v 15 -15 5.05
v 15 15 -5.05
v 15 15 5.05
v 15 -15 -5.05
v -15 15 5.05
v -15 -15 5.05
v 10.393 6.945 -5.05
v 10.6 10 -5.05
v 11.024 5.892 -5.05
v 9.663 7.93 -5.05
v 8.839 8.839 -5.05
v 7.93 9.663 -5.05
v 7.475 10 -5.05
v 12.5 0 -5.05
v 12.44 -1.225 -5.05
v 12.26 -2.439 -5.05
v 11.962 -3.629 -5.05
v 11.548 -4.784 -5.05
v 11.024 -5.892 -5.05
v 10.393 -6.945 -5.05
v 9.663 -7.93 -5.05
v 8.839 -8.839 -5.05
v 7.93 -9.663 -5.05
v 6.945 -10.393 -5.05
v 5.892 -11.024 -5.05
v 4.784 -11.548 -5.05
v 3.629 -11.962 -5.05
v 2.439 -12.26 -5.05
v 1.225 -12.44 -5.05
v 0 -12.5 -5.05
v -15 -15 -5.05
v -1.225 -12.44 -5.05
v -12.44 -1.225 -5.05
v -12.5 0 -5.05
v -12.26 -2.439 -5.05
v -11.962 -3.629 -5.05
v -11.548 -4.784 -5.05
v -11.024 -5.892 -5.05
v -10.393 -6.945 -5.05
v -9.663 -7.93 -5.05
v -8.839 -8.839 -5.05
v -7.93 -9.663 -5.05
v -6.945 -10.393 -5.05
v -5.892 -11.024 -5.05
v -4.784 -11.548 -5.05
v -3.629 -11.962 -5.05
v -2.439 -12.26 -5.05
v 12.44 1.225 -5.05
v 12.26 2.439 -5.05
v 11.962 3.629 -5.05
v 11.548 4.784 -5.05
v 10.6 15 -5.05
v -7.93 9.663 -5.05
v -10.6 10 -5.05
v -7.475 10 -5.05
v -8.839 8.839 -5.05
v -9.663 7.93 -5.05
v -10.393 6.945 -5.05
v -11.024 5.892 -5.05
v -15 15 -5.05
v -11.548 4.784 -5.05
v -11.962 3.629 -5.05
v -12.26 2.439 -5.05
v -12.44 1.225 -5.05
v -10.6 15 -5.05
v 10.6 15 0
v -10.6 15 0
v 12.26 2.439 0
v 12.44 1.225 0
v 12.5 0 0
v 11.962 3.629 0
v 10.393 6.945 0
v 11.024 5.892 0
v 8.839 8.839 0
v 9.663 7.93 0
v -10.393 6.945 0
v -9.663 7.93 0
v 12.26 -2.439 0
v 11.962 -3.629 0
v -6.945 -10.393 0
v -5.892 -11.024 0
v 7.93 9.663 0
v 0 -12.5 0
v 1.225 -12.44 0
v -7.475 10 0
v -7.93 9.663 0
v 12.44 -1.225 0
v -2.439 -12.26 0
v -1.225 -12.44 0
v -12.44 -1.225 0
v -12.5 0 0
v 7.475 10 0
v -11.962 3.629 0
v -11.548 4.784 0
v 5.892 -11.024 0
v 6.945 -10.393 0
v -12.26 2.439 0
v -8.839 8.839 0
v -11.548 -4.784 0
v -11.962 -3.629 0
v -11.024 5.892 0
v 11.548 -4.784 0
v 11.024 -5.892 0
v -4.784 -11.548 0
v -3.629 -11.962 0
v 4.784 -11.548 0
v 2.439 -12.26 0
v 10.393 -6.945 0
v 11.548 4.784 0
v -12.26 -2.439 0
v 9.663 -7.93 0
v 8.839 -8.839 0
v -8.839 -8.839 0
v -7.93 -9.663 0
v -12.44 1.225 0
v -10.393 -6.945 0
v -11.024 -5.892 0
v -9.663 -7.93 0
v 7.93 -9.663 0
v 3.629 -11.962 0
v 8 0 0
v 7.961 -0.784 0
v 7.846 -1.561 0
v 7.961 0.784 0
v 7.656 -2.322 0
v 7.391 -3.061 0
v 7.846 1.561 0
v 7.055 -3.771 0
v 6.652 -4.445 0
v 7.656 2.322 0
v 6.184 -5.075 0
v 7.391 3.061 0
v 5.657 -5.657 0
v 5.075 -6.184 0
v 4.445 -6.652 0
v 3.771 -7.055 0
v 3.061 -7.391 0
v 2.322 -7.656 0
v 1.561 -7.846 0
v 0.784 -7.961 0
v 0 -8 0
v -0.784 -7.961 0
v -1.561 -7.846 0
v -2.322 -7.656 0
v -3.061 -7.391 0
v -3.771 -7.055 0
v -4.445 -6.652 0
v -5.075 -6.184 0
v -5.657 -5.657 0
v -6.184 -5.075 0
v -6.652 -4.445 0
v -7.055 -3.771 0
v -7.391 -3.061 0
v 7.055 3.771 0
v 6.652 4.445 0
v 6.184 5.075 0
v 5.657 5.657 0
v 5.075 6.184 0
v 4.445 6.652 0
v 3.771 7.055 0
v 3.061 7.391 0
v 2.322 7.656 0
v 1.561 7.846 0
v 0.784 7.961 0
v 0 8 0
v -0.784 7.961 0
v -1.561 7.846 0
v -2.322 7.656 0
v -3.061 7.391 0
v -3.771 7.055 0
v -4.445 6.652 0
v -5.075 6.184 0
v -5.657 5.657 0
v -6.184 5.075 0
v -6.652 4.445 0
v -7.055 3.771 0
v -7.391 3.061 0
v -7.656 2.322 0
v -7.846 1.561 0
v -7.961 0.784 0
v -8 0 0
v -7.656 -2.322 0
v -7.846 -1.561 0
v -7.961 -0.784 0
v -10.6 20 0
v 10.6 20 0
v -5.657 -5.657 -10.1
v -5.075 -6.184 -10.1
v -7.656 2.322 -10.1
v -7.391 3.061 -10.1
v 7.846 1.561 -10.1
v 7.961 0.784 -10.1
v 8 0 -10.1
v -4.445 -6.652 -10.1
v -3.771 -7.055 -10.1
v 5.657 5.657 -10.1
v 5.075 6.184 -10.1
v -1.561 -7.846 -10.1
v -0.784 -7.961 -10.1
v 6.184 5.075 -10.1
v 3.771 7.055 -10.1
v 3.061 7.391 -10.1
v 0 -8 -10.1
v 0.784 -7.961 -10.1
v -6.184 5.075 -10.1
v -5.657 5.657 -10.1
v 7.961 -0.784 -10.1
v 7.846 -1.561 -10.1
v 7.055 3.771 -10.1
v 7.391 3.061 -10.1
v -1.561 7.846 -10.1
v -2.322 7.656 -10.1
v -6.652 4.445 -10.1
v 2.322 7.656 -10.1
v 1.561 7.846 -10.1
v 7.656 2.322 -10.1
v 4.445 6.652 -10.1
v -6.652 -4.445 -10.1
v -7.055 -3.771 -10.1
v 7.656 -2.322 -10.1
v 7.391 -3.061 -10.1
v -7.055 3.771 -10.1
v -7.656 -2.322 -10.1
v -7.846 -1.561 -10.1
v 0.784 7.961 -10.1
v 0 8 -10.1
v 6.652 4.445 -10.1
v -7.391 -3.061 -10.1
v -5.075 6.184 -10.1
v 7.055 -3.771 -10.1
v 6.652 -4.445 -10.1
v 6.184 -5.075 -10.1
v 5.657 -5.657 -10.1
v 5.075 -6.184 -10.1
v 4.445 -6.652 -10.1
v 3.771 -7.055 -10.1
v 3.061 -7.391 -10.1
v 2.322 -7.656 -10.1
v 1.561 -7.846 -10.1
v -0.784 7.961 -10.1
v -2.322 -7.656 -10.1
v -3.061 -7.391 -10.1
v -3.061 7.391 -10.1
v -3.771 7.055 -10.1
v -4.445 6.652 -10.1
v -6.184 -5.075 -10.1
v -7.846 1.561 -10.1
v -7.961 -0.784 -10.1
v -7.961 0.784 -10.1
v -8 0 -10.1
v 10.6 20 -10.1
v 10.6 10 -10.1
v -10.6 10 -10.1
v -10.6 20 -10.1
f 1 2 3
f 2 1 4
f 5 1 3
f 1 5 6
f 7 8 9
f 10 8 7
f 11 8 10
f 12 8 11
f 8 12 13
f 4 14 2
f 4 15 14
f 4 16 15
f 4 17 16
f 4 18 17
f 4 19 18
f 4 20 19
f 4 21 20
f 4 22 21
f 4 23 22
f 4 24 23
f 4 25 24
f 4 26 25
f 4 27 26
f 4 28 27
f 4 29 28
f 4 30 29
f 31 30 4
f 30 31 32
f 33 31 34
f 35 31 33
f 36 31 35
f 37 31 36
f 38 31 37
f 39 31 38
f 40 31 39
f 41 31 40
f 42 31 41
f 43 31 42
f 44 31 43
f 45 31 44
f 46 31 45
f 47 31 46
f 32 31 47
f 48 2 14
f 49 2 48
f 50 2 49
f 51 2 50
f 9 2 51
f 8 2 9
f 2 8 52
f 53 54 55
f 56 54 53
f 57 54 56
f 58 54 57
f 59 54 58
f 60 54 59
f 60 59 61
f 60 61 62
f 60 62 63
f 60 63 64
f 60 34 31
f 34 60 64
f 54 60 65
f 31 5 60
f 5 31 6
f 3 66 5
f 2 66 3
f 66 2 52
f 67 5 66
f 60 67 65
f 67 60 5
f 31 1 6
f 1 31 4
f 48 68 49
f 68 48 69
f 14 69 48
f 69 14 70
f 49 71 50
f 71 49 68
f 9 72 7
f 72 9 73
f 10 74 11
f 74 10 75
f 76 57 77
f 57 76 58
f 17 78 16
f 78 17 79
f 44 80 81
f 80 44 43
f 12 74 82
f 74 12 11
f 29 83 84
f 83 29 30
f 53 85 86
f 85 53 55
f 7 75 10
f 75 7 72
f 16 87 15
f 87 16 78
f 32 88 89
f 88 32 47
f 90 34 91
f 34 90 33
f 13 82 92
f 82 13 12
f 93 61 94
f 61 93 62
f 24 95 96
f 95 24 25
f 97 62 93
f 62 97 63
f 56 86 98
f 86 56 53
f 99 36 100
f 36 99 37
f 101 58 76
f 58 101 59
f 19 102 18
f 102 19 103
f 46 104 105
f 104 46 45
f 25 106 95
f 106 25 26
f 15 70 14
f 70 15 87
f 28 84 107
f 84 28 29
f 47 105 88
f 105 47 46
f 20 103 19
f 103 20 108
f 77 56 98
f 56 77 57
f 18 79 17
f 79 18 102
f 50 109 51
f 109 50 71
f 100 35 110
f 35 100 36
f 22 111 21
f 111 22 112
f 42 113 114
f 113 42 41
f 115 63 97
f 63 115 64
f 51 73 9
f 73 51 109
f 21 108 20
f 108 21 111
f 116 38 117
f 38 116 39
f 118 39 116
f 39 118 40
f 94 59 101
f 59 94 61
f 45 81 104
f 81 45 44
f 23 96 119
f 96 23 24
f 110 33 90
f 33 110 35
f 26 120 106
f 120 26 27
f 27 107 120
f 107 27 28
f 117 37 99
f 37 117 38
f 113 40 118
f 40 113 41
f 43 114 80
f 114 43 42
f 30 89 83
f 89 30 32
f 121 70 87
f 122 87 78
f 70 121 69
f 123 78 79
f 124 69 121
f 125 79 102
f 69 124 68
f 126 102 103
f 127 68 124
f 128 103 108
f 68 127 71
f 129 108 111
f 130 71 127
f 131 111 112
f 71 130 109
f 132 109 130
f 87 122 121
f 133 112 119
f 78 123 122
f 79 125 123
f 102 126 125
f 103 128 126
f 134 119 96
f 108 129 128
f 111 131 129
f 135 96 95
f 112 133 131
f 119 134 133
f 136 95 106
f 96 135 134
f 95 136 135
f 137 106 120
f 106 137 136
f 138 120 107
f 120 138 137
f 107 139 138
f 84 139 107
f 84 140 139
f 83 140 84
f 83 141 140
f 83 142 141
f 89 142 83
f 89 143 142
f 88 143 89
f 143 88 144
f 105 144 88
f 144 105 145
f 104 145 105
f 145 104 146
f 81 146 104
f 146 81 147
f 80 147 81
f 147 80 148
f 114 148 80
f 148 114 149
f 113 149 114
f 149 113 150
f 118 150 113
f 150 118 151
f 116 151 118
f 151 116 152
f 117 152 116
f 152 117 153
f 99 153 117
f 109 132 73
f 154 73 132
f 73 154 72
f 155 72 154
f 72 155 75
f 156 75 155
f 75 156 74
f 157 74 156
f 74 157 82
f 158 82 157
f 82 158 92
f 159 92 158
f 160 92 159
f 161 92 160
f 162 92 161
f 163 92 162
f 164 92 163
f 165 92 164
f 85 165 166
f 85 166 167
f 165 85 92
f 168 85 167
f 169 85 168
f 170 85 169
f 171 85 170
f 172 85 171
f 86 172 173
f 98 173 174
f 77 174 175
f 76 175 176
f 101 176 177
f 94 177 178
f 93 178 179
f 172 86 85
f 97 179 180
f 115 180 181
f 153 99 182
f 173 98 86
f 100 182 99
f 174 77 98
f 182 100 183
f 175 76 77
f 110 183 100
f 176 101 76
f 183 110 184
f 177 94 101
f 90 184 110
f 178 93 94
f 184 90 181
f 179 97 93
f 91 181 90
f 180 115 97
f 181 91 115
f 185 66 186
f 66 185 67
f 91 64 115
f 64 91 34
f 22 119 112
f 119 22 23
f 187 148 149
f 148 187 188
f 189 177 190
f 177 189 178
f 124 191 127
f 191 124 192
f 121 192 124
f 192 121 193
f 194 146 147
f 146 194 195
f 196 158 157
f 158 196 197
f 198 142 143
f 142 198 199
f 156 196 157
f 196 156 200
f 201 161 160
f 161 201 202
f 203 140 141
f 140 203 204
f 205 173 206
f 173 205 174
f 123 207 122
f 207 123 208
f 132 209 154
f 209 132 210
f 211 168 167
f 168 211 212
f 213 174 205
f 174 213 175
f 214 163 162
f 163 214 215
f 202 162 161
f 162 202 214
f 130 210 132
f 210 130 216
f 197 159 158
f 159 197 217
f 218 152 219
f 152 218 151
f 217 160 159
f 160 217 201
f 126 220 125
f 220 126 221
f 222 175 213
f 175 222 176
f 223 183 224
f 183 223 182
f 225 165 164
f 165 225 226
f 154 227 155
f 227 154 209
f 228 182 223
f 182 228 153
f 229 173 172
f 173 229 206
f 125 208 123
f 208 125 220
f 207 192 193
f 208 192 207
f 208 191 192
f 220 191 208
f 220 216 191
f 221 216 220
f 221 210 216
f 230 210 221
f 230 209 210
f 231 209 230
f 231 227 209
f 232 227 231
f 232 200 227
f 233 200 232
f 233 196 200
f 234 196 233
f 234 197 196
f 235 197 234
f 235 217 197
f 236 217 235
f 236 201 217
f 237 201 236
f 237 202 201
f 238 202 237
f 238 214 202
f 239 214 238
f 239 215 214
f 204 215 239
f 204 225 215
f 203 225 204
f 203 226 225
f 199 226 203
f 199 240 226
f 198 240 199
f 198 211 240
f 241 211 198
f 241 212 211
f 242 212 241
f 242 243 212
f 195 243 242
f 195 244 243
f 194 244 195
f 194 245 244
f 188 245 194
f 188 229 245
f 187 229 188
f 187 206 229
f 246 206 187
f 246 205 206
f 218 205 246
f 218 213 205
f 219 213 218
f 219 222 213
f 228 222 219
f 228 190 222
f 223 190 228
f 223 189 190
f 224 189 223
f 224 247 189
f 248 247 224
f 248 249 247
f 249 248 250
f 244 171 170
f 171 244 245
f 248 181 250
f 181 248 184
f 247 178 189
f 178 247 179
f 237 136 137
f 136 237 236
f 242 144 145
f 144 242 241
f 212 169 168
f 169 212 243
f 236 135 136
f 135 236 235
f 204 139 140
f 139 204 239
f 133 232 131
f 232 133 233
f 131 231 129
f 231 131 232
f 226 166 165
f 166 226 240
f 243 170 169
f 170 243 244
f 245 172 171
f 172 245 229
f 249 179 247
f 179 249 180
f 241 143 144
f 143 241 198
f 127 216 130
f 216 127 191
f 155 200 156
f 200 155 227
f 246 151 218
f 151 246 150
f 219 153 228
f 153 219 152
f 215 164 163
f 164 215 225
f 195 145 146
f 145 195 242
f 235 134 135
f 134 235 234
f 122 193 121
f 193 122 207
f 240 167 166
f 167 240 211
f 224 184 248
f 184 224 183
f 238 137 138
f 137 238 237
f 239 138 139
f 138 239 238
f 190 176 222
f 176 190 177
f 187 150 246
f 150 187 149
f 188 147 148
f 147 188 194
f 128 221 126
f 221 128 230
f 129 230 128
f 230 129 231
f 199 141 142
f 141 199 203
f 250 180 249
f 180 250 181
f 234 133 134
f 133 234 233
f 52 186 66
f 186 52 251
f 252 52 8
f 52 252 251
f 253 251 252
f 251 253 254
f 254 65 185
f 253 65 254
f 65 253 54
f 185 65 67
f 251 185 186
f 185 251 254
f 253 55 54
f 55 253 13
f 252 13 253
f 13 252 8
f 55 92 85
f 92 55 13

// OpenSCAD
$fn = 64;

module blower_fan() {
    // Main housing
    difference() {
        cube([30, 30, 10.1], center = true);
        translate([0, 0, -5.05])
            cylinder(h = 10.1, d = 25, center = true);
    }
    
    // Rotor hub
    translate([0, 0, -5.05])
        cylinder(h = 10.1, d = 16, center = true);
    
    // Exit port
    translate([0, 15, -5.05])
        cube([21.2, 10, 10.1], center = true);
}

blower_fan();
